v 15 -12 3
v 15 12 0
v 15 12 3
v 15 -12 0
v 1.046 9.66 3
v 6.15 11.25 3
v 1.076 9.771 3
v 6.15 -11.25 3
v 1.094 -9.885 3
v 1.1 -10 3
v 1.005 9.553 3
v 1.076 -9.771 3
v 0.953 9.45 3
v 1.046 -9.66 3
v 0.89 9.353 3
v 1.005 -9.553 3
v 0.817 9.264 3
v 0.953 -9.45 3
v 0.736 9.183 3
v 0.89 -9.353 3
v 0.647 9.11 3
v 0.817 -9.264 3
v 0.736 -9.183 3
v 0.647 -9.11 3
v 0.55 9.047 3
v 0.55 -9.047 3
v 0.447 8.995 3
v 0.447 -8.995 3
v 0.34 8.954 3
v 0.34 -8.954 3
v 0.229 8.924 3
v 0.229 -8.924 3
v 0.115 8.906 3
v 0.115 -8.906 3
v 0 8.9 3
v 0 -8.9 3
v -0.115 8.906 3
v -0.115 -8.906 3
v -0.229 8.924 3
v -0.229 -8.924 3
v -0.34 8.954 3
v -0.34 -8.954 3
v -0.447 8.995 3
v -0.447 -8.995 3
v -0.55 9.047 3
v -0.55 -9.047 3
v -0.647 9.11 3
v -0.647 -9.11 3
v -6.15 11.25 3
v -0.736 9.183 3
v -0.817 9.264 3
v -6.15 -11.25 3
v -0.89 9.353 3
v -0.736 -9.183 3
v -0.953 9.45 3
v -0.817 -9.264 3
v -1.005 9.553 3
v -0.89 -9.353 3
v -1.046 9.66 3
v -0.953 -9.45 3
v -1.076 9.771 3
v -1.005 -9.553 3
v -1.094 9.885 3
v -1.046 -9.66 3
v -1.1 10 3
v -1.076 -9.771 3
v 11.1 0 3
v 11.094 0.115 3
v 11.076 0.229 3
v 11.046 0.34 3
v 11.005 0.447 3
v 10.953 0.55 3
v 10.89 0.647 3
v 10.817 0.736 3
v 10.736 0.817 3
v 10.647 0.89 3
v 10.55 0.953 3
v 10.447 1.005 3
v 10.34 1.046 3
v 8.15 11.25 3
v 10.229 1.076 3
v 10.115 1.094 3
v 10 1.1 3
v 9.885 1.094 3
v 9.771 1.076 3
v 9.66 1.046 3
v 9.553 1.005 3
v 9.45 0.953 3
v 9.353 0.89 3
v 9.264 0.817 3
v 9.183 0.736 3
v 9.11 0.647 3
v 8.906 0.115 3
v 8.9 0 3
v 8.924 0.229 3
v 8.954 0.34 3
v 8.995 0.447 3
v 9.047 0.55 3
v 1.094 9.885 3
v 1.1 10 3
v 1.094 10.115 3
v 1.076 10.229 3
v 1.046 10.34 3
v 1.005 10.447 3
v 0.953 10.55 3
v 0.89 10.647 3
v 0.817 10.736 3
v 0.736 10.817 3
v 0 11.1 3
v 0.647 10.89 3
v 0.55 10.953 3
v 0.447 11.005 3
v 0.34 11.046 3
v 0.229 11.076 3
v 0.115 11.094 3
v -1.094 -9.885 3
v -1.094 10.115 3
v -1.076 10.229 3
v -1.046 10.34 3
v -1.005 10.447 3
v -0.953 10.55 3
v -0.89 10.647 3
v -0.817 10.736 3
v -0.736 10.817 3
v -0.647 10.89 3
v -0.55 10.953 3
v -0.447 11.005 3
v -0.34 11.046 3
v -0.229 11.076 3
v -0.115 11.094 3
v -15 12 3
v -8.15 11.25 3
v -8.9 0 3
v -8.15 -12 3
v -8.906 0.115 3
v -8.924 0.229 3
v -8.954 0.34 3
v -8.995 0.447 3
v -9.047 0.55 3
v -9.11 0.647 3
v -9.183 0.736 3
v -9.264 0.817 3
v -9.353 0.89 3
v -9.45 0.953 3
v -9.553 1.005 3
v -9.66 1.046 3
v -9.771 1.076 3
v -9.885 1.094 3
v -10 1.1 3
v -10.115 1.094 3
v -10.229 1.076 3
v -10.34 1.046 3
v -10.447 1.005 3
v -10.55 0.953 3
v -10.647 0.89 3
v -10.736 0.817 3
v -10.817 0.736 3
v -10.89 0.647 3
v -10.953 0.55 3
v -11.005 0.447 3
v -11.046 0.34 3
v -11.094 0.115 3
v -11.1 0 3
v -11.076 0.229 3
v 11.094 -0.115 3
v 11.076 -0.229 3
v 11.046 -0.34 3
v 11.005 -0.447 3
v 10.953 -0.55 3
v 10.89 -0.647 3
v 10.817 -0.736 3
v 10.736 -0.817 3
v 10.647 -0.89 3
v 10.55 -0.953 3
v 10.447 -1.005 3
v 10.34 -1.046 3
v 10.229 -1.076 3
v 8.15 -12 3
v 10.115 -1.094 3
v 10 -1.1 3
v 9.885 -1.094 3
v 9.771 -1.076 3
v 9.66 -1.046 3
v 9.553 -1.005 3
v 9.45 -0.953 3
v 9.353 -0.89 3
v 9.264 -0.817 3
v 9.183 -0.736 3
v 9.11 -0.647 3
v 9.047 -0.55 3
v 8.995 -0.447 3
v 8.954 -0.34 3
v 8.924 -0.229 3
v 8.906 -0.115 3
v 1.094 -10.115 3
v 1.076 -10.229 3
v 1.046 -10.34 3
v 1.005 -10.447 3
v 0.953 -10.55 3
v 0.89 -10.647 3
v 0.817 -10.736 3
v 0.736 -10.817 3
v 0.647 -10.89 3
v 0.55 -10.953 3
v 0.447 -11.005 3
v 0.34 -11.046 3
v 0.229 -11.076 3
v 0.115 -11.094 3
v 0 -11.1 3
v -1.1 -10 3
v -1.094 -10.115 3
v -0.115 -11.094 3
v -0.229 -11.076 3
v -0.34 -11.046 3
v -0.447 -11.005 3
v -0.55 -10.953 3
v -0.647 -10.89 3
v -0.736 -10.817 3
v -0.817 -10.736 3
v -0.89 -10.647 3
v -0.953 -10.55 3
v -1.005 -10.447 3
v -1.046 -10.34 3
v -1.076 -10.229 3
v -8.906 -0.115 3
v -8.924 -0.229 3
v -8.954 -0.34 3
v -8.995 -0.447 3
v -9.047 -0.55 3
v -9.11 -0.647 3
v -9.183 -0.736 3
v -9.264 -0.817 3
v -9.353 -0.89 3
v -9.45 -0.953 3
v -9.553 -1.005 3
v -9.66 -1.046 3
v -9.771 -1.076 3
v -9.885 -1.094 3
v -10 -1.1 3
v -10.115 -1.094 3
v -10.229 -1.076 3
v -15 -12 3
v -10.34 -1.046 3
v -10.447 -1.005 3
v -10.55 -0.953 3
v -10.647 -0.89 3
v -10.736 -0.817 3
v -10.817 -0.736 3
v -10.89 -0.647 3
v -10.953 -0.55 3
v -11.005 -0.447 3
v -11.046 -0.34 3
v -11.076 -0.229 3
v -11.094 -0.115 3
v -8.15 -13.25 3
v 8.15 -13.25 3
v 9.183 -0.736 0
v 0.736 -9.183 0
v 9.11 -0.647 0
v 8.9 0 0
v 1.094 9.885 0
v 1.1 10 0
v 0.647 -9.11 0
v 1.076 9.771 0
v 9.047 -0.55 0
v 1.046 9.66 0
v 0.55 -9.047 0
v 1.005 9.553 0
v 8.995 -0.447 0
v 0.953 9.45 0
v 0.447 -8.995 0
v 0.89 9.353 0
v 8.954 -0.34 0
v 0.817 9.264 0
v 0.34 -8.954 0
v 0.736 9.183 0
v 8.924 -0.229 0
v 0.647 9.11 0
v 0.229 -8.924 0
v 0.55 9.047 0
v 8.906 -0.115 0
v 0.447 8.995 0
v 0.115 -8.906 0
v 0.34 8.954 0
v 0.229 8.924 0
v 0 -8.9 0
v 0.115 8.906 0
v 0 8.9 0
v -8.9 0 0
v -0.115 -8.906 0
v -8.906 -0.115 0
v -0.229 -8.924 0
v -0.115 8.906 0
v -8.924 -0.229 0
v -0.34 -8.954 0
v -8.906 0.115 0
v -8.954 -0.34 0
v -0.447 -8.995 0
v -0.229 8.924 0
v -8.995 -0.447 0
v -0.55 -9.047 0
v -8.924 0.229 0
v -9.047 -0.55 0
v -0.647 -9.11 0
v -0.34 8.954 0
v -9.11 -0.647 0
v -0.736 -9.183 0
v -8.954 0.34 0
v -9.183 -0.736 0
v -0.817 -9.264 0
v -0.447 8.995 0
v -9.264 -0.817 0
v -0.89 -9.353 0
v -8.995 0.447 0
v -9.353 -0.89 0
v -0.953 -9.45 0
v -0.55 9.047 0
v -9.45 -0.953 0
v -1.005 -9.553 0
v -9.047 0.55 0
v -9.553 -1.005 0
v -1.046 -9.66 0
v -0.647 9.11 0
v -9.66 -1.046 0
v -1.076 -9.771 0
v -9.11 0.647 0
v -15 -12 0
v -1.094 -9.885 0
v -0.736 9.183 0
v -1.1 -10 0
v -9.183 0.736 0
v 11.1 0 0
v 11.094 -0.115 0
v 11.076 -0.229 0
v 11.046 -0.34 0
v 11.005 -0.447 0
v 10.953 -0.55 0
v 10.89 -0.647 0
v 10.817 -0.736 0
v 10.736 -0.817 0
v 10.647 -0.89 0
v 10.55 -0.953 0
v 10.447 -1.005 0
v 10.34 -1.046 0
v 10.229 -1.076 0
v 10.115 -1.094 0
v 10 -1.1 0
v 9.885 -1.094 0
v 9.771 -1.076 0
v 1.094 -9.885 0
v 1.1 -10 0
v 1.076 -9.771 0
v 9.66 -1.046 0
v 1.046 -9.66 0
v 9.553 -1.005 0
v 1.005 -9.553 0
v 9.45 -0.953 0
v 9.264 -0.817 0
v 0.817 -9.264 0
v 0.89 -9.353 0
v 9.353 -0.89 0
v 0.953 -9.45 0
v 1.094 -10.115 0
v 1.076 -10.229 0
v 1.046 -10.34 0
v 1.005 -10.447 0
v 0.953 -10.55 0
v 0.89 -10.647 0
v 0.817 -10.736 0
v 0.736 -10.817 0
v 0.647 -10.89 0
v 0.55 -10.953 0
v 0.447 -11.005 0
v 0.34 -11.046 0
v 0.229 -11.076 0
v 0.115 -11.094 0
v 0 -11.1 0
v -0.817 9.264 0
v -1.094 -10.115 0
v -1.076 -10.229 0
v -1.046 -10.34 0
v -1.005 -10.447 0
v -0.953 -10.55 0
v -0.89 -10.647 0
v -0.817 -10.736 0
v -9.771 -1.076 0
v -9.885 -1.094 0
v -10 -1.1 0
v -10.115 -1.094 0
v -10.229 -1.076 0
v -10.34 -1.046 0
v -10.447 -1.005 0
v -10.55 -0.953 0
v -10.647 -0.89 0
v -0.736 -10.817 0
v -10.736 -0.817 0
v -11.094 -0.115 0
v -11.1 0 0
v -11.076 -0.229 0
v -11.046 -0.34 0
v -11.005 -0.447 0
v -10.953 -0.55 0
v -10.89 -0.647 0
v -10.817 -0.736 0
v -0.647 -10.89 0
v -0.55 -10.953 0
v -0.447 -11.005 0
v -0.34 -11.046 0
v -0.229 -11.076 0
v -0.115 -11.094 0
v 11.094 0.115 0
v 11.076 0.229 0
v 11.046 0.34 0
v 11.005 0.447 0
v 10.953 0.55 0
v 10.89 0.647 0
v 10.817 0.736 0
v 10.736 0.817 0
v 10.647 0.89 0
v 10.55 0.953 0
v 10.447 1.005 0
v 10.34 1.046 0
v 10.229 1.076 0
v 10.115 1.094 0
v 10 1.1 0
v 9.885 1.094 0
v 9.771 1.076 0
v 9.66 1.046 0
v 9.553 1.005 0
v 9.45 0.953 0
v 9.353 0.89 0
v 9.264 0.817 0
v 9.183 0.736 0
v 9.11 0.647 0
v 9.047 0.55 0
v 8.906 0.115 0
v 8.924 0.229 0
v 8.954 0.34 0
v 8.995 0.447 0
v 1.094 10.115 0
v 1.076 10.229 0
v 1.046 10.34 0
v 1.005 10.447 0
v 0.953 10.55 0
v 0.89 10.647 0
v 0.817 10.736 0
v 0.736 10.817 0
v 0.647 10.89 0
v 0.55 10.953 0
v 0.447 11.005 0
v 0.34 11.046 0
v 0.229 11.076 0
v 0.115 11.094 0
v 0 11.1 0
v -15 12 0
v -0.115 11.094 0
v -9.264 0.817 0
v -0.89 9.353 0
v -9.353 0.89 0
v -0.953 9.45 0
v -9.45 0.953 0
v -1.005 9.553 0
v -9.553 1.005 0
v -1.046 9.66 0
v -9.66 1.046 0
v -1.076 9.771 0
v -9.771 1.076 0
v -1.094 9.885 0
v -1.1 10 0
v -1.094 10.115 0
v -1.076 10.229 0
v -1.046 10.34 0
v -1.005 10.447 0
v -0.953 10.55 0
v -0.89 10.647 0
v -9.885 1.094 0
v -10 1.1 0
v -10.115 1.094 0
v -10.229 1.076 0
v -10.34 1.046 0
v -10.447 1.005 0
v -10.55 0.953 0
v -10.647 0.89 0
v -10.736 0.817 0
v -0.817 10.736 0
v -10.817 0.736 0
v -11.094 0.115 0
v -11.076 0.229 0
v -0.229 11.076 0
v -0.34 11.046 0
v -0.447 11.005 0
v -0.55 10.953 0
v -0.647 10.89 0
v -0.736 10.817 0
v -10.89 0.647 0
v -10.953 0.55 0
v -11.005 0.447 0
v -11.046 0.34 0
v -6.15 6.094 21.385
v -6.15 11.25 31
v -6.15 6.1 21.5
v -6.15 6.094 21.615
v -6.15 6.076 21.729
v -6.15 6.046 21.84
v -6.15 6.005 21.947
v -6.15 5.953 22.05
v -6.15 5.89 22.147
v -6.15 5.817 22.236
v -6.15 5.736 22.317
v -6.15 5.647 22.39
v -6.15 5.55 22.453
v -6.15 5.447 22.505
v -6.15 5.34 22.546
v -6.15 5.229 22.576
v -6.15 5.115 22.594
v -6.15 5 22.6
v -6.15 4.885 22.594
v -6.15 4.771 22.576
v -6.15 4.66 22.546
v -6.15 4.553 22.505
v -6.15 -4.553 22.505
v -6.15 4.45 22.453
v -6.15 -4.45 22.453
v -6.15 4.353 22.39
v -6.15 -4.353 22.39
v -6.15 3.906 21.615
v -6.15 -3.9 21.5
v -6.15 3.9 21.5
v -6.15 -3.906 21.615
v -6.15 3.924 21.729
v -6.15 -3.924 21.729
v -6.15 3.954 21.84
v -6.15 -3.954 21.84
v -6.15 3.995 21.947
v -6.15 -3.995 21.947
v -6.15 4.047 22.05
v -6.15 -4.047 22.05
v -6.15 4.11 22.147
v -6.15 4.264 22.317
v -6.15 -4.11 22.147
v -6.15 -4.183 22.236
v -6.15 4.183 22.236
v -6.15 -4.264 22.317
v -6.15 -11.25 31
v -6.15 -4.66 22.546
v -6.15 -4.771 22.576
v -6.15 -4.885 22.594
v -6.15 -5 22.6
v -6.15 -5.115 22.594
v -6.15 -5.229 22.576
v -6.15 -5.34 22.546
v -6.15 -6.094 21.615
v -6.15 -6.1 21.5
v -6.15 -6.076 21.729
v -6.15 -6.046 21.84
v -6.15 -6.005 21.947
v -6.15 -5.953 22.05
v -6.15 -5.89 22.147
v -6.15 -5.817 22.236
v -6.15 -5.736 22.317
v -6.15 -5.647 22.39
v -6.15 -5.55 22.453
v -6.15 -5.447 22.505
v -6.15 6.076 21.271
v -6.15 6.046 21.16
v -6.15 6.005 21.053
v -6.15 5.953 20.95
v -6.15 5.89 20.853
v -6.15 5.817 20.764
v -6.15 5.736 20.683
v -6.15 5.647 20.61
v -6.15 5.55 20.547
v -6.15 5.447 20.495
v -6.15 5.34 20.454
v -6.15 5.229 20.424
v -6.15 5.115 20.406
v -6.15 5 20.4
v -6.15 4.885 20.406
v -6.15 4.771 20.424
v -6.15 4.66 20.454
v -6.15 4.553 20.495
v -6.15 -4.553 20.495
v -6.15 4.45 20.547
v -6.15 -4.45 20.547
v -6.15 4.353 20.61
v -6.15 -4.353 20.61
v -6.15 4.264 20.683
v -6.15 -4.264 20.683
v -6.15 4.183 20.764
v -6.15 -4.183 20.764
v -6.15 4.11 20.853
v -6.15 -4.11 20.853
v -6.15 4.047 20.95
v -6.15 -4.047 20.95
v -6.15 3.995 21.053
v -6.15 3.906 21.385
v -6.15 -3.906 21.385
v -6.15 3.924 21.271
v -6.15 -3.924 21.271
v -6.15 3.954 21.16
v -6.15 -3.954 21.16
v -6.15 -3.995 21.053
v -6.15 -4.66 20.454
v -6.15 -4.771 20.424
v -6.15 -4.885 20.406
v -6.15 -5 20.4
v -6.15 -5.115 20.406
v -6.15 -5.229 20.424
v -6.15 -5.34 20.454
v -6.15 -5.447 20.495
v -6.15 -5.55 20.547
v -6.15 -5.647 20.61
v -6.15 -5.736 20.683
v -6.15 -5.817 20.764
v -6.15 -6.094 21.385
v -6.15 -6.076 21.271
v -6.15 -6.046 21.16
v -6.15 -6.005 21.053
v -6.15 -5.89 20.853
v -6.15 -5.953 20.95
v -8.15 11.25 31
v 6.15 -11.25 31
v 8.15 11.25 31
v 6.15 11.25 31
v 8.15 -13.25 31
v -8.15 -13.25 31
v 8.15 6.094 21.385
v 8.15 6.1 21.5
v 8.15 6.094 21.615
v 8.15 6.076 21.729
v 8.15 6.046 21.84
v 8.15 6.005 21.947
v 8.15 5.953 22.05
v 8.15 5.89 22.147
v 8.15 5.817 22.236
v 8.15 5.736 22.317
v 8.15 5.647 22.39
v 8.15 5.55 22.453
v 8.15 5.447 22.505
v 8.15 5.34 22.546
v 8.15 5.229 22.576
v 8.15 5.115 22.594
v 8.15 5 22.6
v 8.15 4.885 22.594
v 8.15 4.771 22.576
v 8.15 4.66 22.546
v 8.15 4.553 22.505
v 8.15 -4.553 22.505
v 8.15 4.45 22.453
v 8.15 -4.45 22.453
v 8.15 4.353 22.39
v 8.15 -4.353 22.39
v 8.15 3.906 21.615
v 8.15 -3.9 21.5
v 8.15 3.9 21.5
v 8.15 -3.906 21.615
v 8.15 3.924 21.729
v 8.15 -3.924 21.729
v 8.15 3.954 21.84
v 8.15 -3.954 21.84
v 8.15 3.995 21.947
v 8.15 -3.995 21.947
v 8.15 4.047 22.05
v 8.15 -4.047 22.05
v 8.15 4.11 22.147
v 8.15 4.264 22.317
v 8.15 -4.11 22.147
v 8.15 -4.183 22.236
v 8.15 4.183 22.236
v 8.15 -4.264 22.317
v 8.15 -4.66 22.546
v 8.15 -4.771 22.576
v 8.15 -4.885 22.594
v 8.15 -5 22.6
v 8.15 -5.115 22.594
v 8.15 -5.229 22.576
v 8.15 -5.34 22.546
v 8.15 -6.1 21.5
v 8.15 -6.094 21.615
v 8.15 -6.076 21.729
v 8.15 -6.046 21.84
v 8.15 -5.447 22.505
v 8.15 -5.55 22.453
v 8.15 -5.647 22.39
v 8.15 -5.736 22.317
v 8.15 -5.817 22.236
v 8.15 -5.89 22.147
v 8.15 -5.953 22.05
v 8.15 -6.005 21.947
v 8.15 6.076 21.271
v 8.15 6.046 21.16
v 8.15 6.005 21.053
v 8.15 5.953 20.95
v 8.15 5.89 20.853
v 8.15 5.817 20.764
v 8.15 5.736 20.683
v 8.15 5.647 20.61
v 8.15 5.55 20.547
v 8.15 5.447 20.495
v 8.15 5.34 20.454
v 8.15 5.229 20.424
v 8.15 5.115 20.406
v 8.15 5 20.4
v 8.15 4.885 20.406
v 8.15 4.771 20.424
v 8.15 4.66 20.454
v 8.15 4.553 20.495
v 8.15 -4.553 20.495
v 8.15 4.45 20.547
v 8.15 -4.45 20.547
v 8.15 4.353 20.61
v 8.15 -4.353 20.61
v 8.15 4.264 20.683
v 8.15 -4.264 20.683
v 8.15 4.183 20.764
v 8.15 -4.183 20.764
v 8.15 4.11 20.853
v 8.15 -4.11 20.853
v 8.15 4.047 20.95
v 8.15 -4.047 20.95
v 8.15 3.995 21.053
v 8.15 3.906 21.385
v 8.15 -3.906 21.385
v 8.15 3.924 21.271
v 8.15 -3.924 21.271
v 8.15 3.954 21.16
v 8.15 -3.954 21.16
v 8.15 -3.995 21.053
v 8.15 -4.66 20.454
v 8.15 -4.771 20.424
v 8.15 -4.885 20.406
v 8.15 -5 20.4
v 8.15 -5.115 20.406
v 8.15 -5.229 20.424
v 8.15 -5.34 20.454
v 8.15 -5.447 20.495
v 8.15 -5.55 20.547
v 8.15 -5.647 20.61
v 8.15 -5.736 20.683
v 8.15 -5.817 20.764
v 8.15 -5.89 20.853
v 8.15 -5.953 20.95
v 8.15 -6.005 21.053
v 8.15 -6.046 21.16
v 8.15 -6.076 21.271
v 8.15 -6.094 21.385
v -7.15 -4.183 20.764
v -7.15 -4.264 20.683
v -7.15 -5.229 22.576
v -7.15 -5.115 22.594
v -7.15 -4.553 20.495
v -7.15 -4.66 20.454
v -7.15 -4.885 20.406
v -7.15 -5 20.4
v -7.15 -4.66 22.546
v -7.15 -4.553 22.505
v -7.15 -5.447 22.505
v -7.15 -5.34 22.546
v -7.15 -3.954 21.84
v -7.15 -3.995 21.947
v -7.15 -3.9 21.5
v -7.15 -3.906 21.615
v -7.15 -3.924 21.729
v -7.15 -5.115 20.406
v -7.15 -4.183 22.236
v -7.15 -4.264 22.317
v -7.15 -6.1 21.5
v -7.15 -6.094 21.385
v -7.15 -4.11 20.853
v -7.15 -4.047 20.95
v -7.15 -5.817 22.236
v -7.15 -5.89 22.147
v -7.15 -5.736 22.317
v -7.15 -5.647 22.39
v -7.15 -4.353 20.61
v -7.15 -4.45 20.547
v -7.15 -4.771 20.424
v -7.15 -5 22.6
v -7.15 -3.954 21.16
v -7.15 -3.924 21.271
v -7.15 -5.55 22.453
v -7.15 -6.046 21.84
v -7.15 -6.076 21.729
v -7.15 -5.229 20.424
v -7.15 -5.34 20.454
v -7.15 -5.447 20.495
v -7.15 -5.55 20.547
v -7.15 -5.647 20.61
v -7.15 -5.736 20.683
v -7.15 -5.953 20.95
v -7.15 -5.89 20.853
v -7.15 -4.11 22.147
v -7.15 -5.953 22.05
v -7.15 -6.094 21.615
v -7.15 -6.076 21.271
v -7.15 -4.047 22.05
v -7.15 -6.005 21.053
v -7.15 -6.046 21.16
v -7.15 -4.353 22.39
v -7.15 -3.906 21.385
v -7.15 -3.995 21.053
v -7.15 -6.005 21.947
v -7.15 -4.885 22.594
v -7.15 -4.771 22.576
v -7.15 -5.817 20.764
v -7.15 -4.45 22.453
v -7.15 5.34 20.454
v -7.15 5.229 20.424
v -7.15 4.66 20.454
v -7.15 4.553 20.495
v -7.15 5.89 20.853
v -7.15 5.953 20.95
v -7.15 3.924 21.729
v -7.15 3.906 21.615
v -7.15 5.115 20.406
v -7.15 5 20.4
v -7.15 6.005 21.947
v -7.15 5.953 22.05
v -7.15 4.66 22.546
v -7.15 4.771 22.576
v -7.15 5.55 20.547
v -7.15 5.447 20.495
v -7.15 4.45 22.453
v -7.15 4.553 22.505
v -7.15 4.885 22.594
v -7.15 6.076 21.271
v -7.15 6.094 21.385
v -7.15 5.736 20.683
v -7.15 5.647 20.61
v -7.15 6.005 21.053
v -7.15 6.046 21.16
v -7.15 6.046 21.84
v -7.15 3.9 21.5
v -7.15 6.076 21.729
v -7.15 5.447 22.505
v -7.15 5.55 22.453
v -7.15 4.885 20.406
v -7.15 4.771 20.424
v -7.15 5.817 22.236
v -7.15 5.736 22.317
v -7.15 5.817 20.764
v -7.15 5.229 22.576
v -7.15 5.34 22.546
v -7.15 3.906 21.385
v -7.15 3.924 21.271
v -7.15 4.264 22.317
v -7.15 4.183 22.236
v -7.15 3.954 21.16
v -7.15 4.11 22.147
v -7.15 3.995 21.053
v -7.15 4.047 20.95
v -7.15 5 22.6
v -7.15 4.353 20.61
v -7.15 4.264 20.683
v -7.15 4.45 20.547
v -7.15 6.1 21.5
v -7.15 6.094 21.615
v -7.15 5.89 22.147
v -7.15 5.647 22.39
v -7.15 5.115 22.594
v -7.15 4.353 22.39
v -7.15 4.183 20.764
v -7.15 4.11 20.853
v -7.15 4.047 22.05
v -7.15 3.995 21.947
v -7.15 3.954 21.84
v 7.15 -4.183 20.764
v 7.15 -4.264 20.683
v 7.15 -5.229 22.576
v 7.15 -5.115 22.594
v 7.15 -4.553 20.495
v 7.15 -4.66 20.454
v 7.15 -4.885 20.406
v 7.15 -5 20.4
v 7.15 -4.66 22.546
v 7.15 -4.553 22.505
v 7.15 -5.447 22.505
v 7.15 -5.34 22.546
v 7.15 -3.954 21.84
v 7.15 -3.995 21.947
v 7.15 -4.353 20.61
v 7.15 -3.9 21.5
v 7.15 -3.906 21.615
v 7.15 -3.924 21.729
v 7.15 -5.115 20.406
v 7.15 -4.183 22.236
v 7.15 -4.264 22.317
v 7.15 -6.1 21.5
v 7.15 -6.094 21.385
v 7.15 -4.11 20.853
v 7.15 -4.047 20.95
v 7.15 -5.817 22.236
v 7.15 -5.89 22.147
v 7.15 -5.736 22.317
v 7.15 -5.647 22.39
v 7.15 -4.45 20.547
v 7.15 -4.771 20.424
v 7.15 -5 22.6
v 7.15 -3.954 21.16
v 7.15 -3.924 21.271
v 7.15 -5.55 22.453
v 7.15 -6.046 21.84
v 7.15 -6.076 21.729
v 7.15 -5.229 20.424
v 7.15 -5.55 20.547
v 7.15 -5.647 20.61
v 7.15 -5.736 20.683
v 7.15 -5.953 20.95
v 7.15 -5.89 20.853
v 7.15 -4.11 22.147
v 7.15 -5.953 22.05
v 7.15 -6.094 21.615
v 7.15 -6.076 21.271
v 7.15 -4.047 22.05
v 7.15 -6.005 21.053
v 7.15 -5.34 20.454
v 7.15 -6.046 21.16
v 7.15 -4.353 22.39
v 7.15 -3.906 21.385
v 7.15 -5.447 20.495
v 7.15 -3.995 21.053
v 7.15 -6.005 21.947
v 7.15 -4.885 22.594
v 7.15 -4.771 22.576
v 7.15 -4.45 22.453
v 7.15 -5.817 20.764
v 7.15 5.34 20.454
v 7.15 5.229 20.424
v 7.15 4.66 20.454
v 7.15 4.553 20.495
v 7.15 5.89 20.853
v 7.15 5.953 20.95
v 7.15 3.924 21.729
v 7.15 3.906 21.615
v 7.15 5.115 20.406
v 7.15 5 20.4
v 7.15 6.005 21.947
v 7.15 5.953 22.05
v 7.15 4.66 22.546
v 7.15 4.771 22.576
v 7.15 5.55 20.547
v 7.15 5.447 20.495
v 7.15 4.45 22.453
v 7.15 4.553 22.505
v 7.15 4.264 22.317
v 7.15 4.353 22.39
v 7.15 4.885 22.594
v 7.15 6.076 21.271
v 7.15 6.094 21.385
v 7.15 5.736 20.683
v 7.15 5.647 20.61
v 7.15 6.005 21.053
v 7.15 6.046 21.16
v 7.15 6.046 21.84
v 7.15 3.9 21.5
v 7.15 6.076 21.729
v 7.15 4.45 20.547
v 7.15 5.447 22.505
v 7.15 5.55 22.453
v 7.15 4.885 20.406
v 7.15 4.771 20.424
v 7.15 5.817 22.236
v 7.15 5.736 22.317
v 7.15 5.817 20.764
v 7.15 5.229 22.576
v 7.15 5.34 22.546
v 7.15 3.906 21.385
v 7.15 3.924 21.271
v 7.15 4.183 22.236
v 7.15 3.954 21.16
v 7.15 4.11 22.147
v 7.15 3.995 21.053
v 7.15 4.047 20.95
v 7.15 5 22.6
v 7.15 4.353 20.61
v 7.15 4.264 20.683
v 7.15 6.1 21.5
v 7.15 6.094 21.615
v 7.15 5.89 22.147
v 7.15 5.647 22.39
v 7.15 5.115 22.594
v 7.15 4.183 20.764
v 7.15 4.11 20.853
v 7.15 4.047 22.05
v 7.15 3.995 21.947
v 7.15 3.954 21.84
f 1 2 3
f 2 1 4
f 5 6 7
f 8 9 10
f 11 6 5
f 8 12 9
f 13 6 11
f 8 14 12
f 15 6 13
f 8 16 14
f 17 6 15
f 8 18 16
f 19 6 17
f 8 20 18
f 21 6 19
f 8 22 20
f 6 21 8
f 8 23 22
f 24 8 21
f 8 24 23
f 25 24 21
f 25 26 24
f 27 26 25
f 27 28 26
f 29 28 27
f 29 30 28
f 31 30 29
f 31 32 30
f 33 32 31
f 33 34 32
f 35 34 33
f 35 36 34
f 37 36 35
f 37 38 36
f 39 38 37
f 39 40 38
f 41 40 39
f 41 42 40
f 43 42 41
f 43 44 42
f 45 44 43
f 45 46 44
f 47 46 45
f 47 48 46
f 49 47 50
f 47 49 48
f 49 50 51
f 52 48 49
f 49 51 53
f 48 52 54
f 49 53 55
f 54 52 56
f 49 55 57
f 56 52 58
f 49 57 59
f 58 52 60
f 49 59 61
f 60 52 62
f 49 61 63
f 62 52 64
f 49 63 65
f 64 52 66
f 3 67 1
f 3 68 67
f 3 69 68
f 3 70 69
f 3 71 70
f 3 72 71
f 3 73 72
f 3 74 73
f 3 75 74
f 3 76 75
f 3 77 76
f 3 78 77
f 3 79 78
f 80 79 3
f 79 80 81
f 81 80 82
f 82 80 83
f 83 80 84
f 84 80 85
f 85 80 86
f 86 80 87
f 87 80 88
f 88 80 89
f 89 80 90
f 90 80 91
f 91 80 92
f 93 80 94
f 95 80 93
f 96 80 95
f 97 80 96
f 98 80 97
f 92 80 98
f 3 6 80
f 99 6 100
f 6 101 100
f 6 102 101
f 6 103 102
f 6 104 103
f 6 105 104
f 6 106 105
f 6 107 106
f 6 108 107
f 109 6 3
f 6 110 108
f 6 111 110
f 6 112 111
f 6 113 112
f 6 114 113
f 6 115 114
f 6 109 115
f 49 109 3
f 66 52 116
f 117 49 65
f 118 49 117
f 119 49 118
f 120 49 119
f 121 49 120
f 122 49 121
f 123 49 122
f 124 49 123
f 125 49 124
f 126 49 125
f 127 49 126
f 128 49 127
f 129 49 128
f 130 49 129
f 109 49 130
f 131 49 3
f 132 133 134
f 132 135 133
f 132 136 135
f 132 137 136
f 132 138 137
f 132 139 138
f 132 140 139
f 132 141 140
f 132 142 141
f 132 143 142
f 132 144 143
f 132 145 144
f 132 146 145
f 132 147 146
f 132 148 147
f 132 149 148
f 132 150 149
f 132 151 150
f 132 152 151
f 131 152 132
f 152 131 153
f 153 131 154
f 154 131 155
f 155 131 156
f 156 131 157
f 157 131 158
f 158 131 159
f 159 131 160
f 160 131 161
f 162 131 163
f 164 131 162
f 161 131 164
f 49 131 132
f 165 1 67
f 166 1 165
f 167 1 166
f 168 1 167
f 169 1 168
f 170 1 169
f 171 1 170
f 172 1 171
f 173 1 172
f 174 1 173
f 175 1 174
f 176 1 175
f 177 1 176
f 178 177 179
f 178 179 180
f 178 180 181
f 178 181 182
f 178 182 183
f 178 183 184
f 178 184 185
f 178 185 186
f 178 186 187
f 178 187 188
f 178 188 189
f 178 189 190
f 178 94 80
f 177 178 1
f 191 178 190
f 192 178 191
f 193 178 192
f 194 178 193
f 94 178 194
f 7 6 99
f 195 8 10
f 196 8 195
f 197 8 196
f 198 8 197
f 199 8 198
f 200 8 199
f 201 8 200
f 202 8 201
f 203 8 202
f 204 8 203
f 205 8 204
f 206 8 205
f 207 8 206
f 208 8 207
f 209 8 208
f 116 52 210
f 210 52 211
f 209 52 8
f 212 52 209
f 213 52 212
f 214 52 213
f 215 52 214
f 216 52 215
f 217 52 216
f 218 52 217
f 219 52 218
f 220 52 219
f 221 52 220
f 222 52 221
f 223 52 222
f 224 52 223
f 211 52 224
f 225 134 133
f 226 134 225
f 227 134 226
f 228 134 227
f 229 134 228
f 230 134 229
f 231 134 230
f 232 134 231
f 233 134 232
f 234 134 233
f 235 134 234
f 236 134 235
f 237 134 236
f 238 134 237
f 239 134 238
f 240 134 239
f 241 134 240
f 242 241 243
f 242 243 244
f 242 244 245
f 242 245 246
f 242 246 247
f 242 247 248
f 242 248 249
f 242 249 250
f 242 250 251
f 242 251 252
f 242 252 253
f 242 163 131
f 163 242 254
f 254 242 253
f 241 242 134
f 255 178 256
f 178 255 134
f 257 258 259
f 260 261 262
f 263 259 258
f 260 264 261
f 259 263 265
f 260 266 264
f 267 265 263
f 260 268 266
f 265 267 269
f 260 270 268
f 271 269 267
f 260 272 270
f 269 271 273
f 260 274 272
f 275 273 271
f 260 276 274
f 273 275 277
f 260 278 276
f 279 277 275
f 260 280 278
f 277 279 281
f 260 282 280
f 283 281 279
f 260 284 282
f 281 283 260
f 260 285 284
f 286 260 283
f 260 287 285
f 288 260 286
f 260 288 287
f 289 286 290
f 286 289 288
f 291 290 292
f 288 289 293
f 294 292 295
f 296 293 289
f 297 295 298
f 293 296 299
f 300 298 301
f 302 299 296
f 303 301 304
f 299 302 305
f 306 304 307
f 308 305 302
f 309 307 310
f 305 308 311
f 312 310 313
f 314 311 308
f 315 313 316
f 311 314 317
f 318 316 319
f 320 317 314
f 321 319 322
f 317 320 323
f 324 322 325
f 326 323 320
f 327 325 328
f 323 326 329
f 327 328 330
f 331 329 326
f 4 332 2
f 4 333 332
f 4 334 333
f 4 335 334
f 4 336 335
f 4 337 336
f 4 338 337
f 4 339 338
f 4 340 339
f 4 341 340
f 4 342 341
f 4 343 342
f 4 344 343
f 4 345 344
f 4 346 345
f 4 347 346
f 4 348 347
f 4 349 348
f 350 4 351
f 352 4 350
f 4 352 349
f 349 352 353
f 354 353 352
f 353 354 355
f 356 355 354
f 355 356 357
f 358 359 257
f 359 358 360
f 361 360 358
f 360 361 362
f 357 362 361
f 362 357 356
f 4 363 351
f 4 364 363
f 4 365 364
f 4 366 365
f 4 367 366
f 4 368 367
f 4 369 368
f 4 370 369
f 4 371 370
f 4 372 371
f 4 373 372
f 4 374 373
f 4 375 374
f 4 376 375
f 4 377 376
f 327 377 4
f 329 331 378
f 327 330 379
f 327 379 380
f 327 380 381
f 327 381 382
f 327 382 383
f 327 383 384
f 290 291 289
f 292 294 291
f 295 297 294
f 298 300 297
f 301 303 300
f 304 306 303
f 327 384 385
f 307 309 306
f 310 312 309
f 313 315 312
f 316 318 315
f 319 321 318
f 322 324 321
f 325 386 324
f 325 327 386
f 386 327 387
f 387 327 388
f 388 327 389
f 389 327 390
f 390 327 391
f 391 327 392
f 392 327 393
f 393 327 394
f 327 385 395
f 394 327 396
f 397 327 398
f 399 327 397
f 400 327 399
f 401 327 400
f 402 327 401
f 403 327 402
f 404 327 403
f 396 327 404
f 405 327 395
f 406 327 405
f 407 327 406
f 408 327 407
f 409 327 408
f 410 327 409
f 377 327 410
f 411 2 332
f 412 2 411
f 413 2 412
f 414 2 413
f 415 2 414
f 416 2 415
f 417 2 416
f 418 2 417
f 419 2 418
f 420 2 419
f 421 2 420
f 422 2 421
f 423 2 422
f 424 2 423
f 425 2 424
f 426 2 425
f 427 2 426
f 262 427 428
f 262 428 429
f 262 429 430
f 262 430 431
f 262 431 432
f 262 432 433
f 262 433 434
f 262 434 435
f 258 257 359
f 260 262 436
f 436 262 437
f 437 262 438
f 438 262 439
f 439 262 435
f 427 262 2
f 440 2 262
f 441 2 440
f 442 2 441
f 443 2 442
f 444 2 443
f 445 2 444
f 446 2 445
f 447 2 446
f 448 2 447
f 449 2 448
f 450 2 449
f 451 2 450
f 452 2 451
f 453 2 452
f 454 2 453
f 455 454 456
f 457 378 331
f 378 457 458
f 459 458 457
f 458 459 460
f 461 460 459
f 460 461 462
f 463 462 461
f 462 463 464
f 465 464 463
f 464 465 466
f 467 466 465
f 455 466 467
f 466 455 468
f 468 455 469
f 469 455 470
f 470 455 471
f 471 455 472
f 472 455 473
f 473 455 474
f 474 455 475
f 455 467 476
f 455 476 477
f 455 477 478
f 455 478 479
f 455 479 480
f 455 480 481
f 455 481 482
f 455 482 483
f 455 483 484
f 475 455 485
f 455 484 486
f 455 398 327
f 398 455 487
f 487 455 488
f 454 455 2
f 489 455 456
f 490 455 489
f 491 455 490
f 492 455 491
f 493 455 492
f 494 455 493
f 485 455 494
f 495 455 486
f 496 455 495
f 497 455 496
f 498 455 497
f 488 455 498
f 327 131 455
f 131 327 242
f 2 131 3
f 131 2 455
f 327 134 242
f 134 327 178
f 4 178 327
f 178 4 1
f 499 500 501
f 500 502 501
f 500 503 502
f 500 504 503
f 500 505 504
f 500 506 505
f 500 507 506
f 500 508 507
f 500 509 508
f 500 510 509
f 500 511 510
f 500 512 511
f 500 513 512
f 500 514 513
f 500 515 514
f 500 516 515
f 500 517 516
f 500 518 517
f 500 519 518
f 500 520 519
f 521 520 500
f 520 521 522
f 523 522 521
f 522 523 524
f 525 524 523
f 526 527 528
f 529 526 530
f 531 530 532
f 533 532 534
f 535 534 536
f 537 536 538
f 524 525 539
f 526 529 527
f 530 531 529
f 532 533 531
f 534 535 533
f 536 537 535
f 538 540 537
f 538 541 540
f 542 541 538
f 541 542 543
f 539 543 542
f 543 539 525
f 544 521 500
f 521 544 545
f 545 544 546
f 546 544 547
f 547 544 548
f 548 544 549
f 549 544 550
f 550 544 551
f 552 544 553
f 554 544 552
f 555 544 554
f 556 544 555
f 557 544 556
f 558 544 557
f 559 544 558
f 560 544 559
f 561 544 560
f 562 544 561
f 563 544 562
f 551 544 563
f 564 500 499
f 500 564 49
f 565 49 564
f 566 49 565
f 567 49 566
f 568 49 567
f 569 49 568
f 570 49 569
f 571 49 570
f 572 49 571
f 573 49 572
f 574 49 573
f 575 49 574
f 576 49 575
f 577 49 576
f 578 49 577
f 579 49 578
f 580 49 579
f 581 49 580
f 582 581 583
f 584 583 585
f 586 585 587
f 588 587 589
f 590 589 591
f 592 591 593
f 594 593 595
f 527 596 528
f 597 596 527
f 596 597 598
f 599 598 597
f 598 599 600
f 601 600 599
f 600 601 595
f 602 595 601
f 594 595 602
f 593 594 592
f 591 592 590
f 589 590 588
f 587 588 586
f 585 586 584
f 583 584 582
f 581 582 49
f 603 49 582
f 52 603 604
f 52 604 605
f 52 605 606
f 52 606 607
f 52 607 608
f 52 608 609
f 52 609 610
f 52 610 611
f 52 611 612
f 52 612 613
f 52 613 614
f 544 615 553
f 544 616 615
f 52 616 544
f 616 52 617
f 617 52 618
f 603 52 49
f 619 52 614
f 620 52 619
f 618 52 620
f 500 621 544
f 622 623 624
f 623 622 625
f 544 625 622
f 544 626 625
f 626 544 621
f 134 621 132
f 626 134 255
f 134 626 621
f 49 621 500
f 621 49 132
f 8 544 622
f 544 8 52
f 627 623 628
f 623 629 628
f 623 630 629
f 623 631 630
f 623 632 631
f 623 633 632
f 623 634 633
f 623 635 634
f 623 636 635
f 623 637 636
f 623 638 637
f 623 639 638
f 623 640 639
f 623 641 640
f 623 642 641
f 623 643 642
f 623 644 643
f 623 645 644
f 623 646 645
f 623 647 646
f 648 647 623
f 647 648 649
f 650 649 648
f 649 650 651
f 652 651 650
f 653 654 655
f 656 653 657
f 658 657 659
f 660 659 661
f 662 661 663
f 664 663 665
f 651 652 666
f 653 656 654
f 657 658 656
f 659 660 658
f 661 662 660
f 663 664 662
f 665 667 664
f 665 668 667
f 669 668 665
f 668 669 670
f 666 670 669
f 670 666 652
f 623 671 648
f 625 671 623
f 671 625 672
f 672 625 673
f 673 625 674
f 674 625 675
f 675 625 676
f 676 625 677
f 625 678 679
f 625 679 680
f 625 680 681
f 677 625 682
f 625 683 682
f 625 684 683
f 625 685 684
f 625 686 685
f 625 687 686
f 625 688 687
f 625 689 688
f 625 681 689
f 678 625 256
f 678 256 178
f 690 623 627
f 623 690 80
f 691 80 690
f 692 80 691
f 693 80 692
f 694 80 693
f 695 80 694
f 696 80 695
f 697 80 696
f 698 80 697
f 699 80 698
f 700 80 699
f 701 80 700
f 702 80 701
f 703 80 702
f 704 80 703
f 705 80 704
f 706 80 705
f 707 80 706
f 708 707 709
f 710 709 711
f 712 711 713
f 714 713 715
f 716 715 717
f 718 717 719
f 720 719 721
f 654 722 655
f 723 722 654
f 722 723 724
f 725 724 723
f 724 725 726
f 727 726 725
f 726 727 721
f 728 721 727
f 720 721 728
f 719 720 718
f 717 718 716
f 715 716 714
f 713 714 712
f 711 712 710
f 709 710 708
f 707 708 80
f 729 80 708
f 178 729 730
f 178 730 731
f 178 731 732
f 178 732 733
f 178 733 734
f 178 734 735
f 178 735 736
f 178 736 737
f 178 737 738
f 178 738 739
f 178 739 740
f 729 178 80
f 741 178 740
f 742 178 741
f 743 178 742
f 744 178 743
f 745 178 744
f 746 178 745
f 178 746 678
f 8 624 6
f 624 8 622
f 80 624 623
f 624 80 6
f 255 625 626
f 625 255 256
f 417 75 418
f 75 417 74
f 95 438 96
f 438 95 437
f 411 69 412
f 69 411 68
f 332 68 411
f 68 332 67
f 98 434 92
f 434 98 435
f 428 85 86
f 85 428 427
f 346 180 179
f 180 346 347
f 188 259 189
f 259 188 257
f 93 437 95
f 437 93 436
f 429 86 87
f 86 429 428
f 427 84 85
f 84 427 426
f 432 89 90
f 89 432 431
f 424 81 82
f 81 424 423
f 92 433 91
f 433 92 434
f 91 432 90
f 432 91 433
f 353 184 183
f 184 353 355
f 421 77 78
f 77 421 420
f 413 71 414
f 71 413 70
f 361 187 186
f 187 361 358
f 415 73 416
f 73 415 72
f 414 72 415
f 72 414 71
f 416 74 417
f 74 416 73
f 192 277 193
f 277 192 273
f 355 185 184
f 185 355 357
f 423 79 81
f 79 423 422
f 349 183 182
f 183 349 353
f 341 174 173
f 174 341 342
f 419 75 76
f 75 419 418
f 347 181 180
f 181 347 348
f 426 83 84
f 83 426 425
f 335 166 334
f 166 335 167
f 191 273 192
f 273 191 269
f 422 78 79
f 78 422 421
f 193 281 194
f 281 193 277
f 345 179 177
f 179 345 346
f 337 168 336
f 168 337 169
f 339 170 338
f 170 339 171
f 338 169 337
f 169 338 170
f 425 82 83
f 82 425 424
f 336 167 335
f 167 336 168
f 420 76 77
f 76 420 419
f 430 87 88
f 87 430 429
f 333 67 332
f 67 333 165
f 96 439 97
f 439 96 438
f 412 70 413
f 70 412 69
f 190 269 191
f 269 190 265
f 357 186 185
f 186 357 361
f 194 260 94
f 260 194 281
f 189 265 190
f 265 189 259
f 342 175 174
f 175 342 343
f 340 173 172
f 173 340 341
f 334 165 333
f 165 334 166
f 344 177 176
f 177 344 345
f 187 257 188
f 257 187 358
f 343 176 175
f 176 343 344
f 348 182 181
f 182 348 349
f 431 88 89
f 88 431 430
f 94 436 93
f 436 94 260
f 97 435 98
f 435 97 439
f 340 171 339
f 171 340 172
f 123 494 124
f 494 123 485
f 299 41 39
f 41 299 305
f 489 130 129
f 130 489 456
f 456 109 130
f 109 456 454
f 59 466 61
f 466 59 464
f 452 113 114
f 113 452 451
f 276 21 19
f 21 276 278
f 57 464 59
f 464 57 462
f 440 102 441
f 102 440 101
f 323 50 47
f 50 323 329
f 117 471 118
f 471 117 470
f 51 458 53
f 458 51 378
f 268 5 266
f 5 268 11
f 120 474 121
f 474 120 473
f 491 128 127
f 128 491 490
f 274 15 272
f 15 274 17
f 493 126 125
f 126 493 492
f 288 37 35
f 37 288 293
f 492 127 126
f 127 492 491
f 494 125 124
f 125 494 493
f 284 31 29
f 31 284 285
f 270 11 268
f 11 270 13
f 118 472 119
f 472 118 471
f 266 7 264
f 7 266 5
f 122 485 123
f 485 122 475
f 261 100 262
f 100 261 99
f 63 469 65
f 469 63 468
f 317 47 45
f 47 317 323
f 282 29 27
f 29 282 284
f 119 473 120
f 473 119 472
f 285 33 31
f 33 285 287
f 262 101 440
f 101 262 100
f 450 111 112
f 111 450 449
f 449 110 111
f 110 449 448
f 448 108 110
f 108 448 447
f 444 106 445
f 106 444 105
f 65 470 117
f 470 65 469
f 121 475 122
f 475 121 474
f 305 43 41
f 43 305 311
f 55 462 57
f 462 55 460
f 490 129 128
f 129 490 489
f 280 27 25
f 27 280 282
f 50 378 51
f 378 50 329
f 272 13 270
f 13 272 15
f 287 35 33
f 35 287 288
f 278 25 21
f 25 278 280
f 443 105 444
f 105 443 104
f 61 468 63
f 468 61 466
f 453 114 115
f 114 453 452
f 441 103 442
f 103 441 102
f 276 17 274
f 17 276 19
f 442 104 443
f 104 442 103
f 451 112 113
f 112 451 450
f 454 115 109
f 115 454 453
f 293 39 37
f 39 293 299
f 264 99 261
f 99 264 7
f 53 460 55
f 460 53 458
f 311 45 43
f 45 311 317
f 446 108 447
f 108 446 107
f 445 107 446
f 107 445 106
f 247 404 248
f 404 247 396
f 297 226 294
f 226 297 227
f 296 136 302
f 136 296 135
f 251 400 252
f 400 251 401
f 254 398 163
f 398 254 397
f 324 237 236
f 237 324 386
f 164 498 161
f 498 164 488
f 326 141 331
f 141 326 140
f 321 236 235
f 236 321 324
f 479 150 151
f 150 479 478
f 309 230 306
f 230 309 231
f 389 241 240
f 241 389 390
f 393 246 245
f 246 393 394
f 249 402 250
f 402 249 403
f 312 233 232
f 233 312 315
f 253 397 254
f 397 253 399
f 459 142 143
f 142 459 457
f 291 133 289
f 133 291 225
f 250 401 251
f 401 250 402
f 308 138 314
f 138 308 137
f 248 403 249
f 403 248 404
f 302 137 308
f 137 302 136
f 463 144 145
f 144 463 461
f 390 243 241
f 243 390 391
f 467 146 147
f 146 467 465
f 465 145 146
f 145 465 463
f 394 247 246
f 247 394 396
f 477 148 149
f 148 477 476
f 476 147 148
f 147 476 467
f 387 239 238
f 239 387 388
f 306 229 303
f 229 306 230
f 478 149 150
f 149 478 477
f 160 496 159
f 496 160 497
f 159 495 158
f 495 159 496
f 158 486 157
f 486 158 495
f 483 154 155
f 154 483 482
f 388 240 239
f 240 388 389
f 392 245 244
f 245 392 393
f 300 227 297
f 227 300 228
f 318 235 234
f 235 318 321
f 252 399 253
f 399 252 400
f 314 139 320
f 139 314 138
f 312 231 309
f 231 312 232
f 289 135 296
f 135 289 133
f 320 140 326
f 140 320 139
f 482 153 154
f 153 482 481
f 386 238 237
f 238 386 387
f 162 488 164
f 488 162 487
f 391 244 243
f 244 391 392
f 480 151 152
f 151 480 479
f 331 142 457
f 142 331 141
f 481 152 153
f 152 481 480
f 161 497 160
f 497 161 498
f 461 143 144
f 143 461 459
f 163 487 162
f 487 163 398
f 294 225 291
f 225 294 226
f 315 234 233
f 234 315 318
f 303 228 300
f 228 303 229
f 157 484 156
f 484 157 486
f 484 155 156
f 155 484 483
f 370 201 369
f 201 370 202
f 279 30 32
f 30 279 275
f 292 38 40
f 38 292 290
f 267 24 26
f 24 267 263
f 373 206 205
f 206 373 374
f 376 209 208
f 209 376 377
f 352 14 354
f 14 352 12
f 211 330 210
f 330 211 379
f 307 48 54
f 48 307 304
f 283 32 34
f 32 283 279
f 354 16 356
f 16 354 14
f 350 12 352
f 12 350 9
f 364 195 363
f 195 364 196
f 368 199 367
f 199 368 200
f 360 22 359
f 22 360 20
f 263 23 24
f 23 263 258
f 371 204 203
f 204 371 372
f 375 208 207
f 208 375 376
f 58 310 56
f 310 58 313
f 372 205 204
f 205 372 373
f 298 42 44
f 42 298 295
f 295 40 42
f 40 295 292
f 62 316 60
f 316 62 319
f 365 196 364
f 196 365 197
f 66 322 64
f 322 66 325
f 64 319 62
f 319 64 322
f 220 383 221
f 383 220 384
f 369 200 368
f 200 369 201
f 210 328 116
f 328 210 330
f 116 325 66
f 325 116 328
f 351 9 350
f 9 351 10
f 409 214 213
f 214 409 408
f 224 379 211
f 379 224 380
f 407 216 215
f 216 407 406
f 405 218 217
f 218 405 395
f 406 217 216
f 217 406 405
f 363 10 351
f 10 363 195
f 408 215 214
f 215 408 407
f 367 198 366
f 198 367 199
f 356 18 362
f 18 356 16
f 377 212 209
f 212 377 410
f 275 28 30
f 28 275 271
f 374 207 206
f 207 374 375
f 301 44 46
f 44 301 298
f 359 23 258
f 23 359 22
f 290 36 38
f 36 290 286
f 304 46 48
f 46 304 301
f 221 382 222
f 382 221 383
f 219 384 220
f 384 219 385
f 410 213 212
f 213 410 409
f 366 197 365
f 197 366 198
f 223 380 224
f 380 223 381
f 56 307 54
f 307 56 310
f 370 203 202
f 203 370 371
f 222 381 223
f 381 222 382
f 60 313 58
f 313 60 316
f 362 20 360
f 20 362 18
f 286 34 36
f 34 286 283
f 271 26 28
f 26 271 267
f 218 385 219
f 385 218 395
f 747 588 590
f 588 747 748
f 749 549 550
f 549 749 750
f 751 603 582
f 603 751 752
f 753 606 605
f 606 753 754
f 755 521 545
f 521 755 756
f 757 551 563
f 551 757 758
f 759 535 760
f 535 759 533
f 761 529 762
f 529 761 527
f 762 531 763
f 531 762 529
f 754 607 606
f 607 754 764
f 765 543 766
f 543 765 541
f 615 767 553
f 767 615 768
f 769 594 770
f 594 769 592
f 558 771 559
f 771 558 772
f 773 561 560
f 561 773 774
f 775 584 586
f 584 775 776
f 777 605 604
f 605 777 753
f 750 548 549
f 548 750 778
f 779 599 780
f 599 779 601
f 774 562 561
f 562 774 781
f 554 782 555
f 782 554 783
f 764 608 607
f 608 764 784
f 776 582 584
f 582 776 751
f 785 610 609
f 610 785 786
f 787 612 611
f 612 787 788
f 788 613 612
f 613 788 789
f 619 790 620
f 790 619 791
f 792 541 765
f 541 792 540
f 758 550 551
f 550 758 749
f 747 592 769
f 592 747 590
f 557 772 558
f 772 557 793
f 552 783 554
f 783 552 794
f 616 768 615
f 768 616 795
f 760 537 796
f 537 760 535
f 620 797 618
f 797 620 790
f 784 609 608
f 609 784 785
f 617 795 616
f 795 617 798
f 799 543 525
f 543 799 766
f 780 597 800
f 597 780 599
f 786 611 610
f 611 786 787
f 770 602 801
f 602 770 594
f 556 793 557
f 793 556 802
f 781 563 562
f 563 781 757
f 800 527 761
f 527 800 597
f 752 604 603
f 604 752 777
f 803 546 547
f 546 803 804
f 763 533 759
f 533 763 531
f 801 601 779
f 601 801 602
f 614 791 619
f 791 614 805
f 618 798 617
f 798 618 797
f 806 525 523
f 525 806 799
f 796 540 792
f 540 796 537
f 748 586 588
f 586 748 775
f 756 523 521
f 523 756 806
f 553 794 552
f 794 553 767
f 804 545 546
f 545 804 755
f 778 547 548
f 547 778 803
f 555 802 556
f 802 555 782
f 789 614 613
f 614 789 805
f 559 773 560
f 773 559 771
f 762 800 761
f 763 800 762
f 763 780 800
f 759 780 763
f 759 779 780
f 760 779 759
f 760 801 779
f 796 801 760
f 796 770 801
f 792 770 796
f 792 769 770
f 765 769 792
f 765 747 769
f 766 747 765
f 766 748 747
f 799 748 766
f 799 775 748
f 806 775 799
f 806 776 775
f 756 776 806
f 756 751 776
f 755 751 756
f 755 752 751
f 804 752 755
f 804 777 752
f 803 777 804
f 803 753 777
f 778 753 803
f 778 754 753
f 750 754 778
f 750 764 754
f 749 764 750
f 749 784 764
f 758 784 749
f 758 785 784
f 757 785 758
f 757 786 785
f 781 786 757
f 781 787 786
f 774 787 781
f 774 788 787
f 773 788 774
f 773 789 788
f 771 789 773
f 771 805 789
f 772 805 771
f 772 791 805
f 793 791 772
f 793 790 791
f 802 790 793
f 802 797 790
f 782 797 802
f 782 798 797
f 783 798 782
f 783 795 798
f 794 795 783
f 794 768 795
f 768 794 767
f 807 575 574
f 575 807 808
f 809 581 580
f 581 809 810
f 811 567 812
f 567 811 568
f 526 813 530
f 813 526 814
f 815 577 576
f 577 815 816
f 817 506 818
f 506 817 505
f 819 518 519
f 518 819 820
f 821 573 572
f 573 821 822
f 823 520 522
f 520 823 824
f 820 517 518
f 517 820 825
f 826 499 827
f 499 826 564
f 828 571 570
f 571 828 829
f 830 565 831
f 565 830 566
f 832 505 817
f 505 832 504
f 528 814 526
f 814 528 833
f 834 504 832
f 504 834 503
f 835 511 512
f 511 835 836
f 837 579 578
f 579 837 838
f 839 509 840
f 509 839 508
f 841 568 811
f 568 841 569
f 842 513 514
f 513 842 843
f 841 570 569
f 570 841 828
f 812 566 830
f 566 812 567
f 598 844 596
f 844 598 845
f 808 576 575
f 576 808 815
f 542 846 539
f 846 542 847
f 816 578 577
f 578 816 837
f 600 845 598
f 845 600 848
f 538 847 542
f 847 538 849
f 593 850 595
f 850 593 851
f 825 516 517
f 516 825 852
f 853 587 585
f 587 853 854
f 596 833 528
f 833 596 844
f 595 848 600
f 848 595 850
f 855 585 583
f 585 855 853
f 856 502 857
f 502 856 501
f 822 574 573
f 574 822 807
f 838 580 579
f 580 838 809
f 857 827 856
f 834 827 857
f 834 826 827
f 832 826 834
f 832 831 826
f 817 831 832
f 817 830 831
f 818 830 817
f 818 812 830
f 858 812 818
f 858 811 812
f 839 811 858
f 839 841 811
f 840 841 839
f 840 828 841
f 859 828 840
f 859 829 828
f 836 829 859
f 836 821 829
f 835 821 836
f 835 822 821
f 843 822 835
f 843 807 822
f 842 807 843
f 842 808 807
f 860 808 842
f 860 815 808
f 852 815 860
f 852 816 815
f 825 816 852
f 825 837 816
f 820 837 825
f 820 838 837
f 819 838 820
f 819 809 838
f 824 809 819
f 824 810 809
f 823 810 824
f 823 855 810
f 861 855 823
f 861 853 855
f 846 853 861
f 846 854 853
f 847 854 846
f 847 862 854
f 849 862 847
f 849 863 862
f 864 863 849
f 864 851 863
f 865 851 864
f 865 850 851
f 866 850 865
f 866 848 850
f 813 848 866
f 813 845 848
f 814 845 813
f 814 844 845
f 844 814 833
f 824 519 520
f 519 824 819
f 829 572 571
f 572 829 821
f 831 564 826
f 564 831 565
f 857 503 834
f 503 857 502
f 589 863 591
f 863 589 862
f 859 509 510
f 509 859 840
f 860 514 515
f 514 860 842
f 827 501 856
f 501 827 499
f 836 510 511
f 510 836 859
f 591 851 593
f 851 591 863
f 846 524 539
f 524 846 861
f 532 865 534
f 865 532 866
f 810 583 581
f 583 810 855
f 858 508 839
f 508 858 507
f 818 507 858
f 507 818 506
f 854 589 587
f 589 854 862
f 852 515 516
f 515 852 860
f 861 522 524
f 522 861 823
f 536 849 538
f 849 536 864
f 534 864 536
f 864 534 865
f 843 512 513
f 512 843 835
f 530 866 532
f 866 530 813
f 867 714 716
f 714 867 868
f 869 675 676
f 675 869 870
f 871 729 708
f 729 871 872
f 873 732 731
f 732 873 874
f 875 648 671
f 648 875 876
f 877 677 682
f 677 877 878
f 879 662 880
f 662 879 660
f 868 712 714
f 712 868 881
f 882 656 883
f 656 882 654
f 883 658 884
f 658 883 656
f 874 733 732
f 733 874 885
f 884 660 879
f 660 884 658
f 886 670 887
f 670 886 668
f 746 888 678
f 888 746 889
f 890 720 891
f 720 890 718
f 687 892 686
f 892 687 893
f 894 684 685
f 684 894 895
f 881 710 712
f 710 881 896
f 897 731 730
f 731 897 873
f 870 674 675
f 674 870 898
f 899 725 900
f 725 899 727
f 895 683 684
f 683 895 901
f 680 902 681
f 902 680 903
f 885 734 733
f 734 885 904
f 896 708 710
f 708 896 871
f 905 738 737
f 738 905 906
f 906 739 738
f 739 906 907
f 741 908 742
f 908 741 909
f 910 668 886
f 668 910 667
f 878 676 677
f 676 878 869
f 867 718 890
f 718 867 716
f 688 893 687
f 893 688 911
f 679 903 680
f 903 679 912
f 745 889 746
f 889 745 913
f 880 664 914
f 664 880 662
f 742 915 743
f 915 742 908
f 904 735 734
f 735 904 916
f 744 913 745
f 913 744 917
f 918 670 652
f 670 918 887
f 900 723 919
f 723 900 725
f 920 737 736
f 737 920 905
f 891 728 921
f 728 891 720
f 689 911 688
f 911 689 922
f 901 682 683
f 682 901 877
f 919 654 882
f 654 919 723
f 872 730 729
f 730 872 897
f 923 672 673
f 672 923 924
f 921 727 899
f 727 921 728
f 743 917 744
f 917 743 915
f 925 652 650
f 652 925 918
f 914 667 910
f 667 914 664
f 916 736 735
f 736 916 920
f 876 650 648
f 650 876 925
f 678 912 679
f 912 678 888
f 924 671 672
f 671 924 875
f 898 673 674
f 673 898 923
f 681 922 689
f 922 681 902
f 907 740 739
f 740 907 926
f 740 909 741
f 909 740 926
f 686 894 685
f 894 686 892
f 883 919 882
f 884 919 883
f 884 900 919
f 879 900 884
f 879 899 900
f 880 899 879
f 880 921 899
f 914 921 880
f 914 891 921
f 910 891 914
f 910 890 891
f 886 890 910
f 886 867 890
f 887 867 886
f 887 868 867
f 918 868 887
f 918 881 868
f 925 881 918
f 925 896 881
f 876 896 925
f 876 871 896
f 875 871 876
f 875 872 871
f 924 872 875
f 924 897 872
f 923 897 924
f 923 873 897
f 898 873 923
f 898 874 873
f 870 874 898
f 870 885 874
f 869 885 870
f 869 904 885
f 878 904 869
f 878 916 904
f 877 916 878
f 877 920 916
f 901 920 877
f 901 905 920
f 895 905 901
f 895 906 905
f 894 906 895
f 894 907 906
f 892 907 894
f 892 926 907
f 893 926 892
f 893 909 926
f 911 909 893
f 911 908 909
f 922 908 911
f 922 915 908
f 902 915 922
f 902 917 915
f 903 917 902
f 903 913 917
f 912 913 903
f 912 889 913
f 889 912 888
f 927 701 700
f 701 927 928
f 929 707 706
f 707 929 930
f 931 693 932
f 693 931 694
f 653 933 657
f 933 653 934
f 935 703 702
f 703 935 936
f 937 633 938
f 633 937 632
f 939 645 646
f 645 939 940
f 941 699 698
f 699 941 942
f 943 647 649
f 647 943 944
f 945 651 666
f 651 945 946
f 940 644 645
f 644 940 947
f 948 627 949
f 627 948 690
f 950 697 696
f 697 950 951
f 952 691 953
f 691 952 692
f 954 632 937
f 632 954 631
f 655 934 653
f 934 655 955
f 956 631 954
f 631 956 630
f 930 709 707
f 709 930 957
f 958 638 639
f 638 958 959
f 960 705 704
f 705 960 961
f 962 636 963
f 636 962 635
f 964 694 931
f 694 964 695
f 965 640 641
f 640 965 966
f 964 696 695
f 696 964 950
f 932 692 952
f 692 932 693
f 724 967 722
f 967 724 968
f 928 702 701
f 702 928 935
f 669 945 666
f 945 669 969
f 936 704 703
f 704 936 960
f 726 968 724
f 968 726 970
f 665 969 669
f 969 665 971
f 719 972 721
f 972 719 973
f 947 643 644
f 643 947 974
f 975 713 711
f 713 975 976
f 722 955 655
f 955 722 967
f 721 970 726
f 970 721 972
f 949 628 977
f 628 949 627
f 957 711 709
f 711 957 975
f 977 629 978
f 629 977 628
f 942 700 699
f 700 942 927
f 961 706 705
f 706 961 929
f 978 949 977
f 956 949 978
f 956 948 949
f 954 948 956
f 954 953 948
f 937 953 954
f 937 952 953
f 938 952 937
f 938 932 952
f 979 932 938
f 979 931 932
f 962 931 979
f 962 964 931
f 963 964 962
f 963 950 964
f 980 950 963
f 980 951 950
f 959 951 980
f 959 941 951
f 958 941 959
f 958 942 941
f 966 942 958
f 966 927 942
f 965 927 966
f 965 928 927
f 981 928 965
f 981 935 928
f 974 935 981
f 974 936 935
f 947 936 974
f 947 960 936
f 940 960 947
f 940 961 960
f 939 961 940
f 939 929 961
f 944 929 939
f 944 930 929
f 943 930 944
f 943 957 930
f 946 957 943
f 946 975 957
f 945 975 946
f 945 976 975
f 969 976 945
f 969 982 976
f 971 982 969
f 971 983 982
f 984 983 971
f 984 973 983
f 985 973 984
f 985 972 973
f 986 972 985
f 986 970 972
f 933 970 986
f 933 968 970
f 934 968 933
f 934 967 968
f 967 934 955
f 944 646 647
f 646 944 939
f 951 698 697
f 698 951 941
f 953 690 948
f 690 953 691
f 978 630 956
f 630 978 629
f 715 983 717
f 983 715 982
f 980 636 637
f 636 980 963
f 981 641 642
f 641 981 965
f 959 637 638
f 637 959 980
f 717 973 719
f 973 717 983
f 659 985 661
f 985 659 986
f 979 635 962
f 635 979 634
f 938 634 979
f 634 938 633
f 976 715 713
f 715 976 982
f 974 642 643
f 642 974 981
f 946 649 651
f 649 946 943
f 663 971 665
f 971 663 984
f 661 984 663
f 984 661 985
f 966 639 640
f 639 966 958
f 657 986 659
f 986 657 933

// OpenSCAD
// ============================================================================
// 04_Elbow_Bracket
// ============================================================================
// SeaBreeze-Inspector 3DOF 机械臂 — 肘部/小臂舵机支架
// 安装SG90舵机(S3)，U型槽内宽12.3mm适配机身宽11.8mm
// 参数与代码完全吻合: L1=55, L2=45, L3=35, base_height=25
// 生成日期: 2026
// ============================================================================

$fn = 60;

L1 = 55;
L2 = 45;
L3 = 35;
BASE_H = 25;

// SG90 舵机参数 (mm)
SG90_BODY_W = 22.2;
SG90_BODY_H = 11.8;
SG90_BODY_L = 31.0;
SG90_AXIS_H = 26.5;
SG90_AXIS_D = 4.8;
SG90_EAR_HOLE_D = 2.0;
SG90_EAR_SPAN_X = 10.0;
SG90_EAR_SPAN_Y = 22.5;

// 紧固件
M2_D = 2.2;
M2p5_D = 2.7;
M3_D = 3.2;

// 打印参数
WALL = 2.0;
LINK_W = 15.0;
LINK_T = 3.0;


// 肘部支架参数（基于 STL 包围盒 30.5 x 24.5 x 32）
FLANGE_W = 30;      // 法兰宽度 (x)
FLANGE_D = 24;      // 法兰深度 (y)
FLANGE_T = 3;       // 法兰厚度 (z)

U_W = 12.3;         // U型槽内宽 — 适配 SG90 机身宽 11.8mm，留 0.5mm 间隙
U_D = 22.5;         // U型槽内深 — 适配 SG90 机身长 22.2mm，留 0.3mm 间隙
U_H = 28;           // U型槽内高 — 适配 SG90 轴高 26.5mm，留 1.5mm 间隙
U_WALL = WALL;      // 槽壁厚度

module elbow_bracket() {
    difference() {
        union() {
            // 法兰底座
            translate([0, 0, FLANGE_T/2])
                cube([FLANGE_W, FLANGE_D, FLANGE_T], center=true);
            
            // U型槽左壁 (x方向)
            translate([-(U_W/2 + U_WALL/2), 0, U_H/2 + FLANGE_T])
                cube([U_WALL, U_D, U_H], center=true);
            
            // U型槽右壁 (x方向)
            translate([U_W/2 + U_WALL/2, 0, U_H/2 + FLANGE_T])
                cube([U_WALL, U_D, U_H], center=true);
            
            // U型槽底壁 (y方向背面)
            translate([0, -(U_D/2 + U_WALL/2), U_H/2 + FLANGE_T])
                cube([U_W + 2*U_WALL, U_WALL, U_H], center=true);
        }
        
        // 法兰安装孔 (4个，对称分布)
        for(i=[0:3])
            rotate([0, 0, i*90])
            translate([10, 0, -1])
            cylinder(h=FLANGE_T+2, d=M2_D);
        
        // SG90 安装耳孔 (侧壁上，x方向穿透)
        for(side=[-1,1]) for(hole=[-1,1])
            translate([side*(U_W/2 + U_WALL/2), hole*SG90_EAR_SPAN_X/2, SG90_AXIS_H - 5])
            rotate([0, 90, 0])
            cylinder(h=U_WALL+2, d=M2_D);
        
        // SG90 输出轴孔 (底壁上，y方向穿透)
        translate([0, -(U_D/2 + U_WALL + 1), SG90_AXIS_H])
            rotate([90, 0, 0])
            cylinder(h=U_WALL+2, d=8);
        
        // 减重槽（可选，如需要可取消注释）
        // translate([0, U_D/4, U_H/2 + FLANGE_T + 5])
        //     cube([U_W - 4, U_D/2, U_H/2], center=true);
    }
}

elbow_bracket();
